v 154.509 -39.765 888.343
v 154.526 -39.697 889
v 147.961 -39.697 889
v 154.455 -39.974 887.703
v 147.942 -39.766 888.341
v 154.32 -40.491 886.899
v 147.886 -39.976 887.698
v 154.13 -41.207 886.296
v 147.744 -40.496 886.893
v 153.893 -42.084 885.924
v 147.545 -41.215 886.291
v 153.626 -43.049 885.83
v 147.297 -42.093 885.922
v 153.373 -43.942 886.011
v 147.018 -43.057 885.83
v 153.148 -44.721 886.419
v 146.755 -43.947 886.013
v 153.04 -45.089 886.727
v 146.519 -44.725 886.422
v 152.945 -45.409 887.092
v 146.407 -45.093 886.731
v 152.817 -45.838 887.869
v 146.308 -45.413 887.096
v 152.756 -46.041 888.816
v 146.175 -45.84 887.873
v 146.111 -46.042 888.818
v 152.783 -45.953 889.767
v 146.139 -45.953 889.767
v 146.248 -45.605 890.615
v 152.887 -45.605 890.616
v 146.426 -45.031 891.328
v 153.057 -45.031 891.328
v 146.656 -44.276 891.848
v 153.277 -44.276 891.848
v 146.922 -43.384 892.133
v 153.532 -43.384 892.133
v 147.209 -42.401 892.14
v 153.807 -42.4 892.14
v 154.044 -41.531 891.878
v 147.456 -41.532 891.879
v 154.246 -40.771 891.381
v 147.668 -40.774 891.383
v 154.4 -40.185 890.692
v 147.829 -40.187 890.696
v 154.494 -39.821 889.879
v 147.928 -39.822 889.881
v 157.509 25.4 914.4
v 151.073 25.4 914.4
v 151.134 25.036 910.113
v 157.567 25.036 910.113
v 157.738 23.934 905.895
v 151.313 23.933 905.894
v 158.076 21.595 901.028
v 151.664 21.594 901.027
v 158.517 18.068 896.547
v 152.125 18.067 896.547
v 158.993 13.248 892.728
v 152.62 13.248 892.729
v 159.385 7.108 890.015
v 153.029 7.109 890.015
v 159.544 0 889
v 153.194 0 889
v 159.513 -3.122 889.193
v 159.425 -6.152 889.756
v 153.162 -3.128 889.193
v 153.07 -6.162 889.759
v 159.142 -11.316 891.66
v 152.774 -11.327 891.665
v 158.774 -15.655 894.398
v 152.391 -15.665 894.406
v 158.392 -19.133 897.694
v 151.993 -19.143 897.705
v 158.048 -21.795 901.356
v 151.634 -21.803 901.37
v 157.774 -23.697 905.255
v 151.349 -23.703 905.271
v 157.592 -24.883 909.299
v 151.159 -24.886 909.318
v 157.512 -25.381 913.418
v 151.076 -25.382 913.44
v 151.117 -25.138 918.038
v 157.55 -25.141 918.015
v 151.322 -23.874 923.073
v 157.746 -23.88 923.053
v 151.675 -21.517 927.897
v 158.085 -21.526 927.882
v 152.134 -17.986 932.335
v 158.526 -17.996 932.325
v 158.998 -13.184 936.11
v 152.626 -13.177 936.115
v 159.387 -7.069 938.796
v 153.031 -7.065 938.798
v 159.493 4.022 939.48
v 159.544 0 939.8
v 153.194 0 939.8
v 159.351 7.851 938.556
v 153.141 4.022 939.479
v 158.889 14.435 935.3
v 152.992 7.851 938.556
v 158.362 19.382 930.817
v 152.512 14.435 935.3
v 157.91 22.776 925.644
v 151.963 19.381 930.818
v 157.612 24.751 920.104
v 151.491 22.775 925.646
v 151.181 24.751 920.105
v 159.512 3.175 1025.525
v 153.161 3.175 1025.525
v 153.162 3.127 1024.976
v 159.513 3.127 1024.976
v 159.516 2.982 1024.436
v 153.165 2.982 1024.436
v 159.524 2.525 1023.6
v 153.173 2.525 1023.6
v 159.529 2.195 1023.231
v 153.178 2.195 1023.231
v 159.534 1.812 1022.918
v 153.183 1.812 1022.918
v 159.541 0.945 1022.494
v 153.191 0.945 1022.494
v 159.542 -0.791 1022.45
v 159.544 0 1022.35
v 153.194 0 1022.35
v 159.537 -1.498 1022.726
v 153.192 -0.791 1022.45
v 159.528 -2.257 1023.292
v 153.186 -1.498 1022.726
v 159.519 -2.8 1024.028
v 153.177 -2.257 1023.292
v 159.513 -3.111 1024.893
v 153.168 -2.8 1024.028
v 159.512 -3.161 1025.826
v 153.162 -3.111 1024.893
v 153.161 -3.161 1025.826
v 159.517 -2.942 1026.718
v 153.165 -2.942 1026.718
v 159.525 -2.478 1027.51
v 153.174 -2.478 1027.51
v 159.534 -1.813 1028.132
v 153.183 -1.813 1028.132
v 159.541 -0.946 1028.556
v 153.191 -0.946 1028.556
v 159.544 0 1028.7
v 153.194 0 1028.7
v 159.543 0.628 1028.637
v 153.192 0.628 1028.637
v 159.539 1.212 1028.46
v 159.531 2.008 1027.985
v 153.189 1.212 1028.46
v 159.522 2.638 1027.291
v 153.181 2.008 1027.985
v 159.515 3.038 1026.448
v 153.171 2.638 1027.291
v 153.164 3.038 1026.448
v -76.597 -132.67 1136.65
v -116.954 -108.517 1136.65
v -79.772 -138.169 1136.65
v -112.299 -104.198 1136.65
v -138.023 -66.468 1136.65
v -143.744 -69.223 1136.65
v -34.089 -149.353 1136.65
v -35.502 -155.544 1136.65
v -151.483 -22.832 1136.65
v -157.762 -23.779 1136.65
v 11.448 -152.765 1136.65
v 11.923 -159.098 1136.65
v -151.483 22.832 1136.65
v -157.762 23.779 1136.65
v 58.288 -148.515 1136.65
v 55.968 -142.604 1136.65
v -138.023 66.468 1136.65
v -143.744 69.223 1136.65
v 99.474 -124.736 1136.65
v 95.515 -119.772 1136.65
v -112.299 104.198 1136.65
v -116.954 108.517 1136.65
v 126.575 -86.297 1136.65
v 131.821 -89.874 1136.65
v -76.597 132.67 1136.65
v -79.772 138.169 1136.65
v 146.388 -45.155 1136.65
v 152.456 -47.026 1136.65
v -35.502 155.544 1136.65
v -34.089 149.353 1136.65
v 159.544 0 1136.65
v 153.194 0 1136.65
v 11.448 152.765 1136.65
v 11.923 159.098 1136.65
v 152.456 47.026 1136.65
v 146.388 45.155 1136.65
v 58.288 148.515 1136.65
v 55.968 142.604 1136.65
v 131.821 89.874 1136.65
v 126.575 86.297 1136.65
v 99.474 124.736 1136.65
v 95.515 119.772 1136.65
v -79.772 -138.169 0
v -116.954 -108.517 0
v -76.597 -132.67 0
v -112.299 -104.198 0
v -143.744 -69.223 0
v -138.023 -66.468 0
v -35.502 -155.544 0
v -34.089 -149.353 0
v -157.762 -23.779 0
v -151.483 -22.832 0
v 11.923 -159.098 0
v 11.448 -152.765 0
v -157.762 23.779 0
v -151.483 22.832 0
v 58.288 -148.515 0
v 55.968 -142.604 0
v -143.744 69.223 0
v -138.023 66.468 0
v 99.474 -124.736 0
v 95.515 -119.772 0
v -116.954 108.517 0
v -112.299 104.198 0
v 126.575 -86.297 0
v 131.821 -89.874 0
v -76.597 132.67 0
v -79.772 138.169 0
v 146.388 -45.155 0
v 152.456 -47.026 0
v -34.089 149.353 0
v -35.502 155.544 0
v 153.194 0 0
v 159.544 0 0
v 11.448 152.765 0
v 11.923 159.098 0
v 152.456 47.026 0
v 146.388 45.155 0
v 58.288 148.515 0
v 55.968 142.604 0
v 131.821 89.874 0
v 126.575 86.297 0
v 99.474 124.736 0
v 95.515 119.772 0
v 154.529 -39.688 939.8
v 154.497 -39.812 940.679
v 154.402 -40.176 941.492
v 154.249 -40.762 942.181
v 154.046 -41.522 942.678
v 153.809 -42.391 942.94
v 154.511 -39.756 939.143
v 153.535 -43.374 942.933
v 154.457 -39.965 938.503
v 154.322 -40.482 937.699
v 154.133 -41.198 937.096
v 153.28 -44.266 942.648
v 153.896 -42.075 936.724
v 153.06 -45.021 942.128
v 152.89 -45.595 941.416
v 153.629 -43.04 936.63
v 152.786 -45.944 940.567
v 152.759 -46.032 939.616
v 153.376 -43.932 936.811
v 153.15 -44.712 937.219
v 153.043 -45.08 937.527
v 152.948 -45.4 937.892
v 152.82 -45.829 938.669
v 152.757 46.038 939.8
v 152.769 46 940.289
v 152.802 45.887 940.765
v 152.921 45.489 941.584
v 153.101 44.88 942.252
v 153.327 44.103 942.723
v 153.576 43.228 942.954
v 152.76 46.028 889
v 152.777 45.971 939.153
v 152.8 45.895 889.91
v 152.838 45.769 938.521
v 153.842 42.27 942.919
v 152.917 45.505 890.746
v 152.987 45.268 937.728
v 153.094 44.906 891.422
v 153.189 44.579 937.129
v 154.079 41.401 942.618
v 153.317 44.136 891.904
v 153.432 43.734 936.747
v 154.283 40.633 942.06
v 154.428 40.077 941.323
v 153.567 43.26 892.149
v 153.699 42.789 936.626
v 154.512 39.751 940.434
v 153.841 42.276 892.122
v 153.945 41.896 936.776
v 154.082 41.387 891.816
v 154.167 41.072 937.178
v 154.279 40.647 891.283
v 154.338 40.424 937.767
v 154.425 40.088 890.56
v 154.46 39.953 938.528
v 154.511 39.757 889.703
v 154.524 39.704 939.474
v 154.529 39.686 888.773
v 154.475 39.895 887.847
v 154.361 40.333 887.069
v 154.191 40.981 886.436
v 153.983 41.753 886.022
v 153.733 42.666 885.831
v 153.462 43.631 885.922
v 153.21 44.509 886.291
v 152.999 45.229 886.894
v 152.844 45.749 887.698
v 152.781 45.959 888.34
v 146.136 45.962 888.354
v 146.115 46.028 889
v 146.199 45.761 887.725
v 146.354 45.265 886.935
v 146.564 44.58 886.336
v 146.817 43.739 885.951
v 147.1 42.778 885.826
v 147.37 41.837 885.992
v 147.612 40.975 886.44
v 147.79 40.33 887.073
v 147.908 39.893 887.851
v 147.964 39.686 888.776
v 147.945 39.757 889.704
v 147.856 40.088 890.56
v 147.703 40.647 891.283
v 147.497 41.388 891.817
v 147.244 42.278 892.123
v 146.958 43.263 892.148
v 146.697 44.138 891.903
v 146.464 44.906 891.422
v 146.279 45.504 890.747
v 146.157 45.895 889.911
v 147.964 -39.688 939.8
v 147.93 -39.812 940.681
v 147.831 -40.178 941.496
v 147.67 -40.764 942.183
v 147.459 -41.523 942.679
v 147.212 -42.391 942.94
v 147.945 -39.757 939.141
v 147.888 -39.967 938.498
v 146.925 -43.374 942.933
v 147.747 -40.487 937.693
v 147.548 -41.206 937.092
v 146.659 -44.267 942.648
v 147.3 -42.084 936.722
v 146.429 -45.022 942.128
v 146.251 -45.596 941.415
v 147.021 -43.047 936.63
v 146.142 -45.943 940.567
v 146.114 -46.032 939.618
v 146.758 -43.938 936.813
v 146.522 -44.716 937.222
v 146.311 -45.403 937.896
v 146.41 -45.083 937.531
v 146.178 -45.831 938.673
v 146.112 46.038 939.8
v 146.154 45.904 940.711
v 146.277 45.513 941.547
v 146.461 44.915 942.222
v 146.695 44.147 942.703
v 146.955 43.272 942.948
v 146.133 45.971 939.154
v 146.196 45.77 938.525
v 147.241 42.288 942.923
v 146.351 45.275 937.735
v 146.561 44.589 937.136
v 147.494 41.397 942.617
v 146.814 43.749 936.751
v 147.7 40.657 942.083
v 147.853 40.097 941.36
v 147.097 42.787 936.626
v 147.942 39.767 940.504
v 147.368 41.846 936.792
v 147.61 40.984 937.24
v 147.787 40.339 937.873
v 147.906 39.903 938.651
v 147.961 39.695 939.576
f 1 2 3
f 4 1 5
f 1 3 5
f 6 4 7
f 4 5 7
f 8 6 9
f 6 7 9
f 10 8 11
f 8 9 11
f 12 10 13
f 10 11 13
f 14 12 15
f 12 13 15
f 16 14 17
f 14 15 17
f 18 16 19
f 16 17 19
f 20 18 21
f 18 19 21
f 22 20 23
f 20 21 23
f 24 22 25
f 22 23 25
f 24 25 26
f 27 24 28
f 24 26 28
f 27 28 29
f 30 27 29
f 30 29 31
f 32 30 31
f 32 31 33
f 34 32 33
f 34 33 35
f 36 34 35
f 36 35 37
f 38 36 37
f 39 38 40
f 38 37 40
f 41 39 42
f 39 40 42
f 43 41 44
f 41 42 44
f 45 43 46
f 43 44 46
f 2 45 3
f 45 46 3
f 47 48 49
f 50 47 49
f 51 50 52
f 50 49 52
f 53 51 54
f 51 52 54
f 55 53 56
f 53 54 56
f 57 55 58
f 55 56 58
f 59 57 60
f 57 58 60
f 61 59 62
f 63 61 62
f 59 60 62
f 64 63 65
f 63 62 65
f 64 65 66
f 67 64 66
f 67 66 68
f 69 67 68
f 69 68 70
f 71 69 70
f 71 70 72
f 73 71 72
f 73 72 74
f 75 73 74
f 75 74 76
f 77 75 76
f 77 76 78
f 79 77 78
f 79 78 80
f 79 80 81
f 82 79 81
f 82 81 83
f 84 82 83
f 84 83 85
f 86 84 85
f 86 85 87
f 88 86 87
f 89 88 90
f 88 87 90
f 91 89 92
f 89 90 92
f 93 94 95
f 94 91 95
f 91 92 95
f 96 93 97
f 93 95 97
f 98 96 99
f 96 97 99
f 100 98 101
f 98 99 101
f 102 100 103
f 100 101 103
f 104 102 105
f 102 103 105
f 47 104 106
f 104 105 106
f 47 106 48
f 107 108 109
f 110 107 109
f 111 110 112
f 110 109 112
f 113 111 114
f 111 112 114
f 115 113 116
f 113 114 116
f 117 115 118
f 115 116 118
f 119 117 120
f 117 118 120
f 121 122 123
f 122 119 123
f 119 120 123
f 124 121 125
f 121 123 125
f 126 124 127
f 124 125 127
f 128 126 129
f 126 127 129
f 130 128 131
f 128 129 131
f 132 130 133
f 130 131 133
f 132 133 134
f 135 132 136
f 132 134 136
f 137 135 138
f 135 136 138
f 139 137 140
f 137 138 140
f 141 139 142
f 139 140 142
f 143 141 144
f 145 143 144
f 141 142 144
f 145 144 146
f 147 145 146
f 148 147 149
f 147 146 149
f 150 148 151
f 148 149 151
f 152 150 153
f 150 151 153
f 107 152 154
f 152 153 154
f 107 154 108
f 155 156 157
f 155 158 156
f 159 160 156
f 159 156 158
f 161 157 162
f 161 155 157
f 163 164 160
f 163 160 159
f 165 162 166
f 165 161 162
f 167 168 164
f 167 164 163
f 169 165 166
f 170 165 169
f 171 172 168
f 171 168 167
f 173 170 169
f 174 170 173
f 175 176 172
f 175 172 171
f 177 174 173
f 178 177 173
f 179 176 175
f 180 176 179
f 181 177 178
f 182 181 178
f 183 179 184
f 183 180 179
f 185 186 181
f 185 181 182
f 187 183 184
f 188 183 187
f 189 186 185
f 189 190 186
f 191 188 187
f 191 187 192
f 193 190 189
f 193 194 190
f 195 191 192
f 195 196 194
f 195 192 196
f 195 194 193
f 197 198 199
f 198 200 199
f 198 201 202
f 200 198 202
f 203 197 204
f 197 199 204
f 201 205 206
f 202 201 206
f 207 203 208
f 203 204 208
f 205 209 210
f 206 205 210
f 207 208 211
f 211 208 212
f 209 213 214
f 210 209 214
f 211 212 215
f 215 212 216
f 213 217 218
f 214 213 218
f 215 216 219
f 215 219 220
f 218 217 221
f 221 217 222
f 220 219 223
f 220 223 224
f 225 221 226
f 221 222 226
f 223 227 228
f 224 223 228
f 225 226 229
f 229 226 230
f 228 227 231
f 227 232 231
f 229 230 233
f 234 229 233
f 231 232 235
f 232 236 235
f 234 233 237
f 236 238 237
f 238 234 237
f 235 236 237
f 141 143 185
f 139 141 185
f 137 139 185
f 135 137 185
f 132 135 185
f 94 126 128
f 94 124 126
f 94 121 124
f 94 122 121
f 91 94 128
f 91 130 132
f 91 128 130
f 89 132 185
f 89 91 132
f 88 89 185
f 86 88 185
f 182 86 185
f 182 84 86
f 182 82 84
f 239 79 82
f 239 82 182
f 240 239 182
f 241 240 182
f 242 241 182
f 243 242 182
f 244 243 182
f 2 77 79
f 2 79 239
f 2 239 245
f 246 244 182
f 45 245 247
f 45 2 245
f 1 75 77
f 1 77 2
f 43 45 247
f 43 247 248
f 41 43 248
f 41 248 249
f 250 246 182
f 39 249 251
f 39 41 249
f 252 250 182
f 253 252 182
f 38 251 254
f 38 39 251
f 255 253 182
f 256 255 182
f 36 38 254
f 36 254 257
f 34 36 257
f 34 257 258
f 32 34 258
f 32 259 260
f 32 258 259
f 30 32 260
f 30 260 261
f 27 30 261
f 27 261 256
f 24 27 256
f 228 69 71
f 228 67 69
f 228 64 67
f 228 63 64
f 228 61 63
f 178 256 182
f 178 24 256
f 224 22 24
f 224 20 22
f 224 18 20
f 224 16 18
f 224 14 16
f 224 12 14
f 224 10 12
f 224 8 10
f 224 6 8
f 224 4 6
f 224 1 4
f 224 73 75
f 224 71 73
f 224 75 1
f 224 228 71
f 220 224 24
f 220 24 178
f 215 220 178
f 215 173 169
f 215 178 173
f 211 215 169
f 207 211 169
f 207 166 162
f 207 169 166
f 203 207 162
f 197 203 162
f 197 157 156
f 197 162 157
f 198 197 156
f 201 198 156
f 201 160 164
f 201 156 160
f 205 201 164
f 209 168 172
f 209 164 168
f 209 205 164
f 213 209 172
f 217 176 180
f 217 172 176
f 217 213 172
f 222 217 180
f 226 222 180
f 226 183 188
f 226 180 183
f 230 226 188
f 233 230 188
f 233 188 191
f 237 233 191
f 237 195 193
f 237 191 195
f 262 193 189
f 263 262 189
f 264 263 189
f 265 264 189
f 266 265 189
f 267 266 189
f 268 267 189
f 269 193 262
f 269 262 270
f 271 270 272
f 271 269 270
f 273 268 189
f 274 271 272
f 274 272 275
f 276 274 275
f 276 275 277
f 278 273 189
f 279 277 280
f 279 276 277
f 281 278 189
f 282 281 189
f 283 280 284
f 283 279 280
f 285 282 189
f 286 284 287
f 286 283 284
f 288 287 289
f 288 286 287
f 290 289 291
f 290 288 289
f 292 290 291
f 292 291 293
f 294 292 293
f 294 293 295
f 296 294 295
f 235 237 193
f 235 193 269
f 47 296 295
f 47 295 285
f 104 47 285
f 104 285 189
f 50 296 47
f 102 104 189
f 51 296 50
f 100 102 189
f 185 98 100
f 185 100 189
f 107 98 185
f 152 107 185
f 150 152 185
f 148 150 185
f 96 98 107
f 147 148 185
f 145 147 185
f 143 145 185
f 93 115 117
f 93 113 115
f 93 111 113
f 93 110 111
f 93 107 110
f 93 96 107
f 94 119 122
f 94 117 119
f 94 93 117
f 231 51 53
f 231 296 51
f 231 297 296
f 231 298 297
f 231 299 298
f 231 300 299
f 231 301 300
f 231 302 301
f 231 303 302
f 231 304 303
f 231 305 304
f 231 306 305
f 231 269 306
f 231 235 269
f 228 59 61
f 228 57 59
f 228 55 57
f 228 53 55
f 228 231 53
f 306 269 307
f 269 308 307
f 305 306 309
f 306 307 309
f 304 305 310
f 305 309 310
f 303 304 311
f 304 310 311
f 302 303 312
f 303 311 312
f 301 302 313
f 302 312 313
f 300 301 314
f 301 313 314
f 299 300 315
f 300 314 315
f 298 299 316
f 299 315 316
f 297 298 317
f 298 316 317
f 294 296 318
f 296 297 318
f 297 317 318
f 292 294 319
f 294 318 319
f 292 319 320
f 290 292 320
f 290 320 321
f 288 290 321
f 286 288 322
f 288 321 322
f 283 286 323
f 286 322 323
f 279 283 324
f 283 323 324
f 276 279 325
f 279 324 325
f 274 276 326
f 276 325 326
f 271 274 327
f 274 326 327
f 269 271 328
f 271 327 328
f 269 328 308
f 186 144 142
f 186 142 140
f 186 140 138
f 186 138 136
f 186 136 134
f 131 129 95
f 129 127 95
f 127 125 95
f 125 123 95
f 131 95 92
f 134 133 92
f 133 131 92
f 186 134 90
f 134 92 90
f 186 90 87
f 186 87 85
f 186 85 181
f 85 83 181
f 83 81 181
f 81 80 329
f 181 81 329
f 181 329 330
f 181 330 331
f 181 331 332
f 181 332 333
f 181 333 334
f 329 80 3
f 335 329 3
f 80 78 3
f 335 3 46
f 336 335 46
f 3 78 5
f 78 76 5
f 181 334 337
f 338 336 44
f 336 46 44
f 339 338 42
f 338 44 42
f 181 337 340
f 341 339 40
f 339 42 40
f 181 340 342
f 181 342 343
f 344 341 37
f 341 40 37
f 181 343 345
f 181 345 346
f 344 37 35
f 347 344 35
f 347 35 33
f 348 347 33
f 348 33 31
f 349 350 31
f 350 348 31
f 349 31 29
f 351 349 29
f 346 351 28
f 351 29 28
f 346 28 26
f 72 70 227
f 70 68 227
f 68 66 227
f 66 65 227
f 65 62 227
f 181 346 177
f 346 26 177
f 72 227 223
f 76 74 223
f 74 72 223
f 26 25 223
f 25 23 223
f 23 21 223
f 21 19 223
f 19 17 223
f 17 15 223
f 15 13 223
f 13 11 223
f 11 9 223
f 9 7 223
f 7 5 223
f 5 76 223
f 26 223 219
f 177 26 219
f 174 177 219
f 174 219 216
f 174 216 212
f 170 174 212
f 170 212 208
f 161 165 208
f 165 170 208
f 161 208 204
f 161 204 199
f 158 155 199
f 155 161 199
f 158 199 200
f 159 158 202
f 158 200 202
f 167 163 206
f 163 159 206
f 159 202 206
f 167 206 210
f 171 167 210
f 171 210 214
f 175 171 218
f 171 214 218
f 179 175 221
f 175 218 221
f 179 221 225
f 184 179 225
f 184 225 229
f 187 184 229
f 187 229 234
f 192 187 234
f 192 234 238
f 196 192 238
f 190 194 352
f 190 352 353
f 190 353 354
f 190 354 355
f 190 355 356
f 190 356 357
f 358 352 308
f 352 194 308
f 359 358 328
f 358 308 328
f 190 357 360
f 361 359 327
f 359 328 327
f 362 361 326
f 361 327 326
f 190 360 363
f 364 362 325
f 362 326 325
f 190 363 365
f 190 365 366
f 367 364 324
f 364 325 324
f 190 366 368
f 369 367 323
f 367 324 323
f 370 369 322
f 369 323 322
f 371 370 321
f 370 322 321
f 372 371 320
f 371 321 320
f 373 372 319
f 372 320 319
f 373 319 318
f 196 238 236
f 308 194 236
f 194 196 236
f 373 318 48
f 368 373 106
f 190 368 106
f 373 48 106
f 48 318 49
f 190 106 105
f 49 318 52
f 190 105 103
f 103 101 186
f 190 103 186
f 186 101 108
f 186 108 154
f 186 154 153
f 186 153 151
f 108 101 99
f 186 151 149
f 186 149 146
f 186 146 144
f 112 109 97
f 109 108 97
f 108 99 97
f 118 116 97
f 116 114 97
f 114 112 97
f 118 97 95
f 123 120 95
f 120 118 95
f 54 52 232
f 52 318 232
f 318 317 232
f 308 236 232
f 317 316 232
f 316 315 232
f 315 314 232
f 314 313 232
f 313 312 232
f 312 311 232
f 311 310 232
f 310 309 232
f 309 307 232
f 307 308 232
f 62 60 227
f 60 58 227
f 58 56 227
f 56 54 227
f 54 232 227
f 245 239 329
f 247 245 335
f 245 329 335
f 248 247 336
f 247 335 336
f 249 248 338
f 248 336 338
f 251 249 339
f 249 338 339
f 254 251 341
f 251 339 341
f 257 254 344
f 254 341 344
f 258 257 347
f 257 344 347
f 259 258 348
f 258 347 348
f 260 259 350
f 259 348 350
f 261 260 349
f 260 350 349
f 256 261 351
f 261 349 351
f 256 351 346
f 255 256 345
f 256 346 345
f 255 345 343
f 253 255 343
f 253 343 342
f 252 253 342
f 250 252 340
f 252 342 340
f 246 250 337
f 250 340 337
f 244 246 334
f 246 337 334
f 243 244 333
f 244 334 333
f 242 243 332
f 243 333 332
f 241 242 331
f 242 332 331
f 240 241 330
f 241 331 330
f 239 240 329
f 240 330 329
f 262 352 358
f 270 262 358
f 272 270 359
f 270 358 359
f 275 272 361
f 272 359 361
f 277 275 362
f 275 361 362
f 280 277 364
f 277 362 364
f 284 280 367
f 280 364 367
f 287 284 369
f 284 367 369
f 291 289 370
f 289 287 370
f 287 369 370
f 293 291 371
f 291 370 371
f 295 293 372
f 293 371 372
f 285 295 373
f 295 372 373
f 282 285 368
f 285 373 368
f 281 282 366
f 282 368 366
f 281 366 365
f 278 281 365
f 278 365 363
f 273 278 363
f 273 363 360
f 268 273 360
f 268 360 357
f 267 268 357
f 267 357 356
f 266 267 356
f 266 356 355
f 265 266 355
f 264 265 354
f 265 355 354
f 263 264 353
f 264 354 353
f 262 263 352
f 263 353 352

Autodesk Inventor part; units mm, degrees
ref_plane "YZ Plane" through (0, 0, 0) normal (1, 0, 0) x (0, 1, 0)
ref_plane "XZ Plane" through (0, 0, 0) normal (0, 1, 0) x (-1, 0, 0)
ref_plane "XY Plane" through (0, 0, 0) normal (0, 0, 1) x (1, 0, 0)
sketch "Sketch1" plane through (0, 0, 0) normal (0, 0, 1) x (1, 0, 0)
  circle A0 centre (0, 0) radius 161.1312
  circle A1 centre (0, 0) radius 151.6062
  circle A2 centre (0, 0) radius 153.1937
  circle A3 centre (0, 0) radius 159.5438
  dimension "d2" = 9.525
  dimension "d3" = 303.2125
  dimension "d4" = 322.2625
  dimension "d13" = 306.3875
  dimension "d14" = 319.0875
  dimension "d15" = 6.35
  dimension "d16" = 1.5875
  dimension "d35" = 0
extrude "Extrusion1" add sketch "Sketch1" along normal blind 1136.65 contours A3
sketch "Sketch2" plane through (0, 0, 0) normal (1, 0, 0) x (0, 1, 0)
  circle A0 centre (0, 914.4) radius 25.4
  line L0 (159.5438, 1136.65) -> (-159.5438, 1136.65) projected
  circle A1 centre (0, 1025.525) radius 3.175
  circle A2 centre (42.8625, 939.8) radius 3.175
  circle A3 centre (-42.8625, 939.8) radius 3.175
  circle A4 centre (42.8532, 889) radius 3.175
  circle A5 centre (-42.8718, 889) radius 3.175
  point P0 (0, 0)
  point P1 (0, 1136.65)
  dimension "d21" = 50.8
  dimension "d22" = 222.25
  dimension "d23" = 6.35
  dimension "d24" = 111.125
  dimension "d25" = 6.35
  dimension "d26" = 6.35
  dimension "d27" = 85.725
  dimension "d28" = 42.8625
  dimension "d29" = 6.35
  dimension "d30" = 6.35
  dimension "d31" = 85.725
  dimension "d32" = 50.8
extrude "Extrusion3" cut sketch "Sketch2" along normal through all
properties part number "tube"
